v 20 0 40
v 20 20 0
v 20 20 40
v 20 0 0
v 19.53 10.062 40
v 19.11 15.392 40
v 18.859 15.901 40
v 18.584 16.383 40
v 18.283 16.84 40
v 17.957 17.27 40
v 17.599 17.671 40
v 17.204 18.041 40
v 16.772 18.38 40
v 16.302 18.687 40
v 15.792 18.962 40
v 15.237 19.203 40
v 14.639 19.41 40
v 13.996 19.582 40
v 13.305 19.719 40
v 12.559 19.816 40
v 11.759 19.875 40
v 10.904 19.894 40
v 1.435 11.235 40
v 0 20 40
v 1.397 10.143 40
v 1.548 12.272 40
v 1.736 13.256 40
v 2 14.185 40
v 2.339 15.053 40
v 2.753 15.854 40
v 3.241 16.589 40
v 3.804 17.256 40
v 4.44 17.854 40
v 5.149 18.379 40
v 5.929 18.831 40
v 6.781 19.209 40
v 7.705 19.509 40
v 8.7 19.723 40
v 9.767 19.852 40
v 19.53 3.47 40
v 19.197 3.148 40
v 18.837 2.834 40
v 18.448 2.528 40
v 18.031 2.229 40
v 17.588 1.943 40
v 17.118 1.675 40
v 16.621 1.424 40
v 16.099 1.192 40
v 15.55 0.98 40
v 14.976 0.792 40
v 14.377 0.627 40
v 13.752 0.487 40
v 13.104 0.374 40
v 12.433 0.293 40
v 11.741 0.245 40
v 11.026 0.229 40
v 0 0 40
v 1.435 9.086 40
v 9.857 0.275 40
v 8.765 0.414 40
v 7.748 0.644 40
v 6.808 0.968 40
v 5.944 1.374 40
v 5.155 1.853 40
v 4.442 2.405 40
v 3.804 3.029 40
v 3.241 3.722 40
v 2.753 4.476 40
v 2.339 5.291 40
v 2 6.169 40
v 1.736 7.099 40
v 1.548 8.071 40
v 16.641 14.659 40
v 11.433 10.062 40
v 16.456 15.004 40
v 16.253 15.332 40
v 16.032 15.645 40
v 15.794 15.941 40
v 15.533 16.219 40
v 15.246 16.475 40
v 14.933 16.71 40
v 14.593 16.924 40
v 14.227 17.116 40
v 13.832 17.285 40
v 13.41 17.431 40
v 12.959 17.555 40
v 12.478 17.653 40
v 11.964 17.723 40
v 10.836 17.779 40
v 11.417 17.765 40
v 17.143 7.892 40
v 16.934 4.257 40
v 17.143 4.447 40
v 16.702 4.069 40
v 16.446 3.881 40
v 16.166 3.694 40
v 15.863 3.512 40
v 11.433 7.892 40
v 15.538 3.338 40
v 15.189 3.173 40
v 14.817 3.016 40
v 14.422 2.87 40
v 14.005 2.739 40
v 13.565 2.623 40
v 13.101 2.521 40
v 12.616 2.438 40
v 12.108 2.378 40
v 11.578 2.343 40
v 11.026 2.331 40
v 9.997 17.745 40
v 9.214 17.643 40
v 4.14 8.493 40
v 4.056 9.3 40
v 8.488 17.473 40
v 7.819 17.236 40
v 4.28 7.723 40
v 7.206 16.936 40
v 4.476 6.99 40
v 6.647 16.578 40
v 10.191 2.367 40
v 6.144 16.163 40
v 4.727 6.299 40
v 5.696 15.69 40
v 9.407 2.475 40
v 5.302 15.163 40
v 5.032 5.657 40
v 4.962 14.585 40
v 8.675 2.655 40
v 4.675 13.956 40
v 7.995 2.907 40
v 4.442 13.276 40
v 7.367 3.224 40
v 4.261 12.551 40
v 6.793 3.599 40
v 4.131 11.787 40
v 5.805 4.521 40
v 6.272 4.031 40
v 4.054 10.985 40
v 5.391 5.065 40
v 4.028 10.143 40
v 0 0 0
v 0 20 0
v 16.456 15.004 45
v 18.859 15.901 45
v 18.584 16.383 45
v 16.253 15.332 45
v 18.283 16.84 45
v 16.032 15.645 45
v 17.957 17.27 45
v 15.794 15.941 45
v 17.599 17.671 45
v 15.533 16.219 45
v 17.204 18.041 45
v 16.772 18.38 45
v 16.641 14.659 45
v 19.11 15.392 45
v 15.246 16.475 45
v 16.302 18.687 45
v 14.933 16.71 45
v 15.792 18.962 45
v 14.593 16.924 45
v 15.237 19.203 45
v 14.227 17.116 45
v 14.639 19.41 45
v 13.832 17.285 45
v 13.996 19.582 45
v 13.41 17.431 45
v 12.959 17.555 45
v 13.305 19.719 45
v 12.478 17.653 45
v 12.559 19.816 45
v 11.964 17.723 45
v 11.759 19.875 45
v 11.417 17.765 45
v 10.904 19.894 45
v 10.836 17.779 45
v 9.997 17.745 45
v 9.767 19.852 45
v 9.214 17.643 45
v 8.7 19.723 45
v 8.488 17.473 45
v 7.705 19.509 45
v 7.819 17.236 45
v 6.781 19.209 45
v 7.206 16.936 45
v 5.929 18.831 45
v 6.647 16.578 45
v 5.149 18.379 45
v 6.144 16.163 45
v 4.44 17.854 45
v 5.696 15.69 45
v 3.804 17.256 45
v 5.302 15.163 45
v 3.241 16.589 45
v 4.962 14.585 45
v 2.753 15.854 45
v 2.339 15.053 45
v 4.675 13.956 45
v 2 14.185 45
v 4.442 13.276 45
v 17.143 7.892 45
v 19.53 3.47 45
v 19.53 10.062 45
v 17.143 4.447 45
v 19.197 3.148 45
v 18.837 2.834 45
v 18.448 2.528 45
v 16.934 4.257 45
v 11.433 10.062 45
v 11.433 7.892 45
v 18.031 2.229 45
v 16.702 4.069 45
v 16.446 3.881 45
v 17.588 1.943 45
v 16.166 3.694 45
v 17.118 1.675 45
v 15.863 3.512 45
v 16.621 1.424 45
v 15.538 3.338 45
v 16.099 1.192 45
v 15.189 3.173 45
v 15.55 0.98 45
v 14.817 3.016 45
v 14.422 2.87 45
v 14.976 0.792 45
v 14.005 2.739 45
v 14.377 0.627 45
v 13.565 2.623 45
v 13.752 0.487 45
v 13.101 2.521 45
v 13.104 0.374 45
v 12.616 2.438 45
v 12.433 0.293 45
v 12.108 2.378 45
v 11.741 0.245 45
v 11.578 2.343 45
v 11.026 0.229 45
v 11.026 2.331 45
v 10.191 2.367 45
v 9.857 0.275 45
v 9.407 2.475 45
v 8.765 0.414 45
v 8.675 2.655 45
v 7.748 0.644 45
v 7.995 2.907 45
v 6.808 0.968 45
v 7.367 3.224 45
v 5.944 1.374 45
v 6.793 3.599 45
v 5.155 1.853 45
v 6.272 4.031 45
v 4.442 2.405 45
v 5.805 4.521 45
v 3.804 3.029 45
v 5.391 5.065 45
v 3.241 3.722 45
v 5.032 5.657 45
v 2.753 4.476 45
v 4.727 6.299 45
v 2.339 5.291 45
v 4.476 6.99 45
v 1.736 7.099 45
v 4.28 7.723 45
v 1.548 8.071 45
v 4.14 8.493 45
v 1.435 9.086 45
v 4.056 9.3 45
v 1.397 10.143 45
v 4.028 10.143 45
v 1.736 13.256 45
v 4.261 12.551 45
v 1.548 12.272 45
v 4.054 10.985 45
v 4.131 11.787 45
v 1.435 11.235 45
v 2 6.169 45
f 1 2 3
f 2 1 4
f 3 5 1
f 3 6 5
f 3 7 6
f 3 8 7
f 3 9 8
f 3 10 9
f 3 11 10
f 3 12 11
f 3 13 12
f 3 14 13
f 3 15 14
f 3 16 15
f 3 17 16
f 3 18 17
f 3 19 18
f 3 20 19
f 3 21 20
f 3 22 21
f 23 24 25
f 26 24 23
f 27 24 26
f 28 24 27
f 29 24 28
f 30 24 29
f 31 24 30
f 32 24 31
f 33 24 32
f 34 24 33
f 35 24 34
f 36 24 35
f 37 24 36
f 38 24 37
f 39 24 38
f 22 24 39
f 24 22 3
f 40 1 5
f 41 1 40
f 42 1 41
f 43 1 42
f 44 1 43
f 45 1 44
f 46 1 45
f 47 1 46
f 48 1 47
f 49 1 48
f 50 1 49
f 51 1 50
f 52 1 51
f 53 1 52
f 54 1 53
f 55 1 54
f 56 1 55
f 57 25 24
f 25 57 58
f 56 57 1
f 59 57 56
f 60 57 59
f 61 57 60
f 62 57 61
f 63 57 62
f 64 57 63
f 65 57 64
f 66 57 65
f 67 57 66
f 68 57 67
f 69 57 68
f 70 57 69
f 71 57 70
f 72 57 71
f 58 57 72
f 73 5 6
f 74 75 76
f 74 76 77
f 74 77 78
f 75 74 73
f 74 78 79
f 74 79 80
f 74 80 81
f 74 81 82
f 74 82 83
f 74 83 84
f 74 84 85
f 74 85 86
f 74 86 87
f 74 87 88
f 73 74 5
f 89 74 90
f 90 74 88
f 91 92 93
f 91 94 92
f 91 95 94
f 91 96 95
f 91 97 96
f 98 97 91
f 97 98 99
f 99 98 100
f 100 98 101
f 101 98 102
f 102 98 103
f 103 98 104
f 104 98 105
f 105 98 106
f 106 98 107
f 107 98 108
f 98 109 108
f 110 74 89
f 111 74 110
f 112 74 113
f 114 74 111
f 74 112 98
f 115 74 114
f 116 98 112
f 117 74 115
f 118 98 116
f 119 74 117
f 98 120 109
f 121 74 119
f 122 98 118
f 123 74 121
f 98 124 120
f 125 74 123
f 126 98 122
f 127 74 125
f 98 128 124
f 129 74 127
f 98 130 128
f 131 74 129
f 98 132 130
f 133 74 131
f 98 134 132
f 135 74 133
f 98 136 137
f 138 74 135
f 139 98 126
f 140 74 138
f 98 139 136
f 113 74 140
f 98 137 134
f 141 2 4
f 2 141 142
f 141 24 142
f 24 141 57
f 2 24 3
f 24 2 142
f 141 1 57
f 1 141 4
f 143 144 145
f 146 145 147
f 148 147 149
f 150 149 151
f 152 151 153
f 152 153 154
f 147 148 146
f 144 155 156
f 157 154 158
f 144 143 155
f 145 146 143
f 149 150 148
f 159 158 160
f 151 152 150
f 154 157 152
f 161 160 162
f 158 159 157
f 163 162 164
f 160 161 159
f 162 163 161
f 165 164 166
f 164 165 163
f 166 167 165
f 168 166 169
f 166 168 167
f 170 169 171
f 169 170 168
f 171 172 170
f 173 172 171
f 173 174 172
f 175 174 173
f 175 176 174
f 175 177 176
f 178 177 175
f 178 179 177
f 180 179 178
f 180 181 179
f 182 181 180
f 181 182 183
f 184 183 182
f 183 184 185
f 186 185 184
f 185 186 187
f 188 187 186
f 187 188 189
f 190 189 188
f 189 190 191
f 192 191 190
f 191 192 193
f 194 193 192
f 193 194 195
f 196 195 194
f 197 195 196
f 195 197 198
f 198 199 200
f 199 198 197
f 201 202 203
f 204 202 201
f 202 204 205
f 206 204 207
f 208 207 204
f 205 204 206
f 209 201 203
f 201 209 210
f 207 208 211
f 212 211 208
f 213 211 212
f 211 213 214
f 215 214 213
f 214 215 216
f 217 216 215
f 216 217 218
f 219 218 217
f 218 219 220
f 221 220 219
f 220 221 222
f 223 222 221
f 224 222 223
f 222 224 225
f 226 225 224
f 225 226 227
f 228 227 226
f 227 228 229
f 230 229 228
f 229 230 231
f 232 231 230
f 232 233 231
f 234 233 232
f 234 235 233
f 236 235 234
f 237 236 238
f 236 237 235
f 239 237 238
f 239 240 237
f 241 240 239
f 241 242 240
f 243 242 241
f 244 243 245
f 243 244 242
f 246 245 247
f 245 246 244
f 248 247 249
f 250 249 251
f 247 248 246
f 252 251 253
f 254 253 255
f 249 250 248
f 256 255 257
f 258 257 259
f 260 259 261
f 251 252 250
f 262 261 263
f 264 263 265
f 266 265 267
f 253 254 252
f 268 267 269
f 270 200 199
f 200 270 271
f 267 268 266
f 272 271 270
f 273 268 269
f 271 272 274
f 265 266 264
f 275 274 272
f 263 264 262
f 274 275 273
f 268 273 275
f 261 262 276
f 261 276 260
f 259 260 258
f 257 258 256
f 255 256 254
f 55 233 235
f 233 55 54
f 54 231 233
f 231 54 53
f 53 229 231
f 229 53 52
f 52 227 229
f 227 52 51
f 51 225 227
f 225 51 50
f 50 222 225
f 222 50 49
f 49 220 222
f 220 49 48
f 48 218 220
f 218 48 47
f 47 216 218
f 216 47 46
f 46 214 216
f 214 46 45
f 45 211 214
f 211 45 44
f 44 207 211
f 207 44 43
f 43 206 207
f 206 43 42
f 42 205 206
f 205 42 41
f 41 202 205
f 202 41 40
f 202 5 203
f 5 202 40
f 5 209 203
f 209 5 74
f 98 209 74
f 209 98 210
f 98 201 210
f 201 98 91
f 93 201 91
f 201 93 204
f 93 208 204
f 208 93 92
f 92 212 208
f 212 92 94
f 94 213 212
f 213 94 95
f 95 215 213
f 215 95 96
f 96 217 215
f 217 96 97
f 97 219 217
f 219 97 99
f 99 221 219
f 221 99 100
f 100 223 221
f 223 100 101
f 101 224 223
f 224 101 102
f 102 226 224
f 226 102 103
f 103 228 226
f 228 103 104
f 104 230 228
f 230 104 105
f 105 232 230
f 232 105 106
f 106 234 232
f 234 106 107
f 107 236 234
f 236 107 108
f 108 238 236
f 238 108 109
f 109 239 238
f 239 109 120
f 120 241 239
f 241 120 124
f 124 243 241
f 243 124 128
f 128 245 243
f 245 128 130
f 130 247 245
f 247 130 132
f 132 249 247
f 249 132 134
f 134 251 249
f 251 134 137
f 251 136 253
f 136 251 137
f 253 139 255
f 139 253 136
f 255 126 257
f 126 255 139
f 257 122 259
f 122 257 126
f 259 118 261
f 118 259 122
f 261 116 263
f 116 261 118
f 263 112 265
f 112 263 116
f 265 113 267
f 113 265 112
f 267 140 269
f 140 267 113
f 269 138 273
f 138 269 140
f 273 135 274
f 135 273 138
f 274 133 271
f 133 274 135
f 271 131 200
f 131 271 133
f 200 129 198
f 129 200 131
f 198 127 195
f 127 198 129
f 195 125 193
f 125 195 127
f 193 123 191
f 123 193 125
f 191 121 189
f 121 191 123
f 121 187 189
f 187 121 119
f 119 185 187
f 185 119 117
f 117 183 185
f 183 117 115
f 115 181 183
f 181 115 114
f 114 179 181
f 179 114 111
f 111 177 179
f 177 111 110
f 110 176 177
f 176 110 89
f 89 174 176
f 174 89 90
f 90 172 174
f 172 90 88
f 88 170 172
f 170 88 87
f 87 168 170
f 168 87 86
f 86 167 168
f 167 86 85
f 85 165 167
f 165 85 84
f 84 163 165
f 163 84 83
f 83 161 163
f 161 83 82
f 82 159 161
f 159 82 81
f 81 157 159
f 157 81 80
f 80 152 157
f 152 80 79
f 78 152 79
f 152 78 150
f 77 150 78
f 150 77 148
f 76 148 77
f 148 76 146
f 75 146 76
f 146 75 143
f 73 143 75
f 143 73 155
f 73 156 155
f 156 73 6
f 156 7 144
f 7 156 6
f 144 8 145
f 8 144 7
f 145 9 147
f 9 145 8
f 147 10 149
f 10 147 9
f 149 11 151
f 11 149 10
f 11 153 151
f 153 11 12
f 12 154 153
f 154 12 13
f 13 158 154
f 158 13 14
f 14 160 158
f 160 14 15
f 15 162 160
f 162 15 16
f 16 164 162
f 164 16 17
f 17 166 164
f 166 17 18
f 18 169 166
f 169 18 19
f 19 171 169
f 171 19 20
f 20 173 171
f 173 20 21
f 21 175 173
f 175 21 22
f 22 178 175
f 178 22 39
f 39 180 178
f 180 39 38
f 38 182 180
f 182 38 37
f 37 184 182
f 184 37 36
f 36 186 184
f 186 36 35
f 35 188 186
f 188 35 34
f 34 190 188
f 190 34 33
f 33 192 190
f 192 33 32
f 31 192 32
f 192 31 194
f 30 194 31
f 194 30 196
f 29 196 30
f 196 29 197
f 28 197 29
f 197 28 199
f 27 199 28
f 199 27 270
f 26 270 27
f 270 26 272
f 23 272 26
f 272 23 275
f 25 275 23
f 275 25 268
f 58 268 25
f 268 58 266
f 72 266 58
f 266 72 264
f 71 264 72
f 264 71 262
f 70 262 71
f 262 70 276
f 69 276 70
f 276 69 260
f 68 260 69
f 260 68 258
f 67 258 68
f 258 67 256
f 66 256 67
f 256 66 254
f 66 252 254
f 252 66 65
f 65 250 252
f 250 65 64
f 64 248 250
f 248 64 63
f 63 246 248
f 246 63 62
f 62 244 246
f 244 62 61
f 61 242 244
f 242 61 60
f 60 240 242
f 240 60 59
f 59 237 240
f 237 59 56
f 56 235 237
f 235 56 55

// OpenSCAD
cube([20, 20, 40]);
translate([0, 0.5, 40]){
    linear_extrude(5){
        text("G", size=20);
    }
}
